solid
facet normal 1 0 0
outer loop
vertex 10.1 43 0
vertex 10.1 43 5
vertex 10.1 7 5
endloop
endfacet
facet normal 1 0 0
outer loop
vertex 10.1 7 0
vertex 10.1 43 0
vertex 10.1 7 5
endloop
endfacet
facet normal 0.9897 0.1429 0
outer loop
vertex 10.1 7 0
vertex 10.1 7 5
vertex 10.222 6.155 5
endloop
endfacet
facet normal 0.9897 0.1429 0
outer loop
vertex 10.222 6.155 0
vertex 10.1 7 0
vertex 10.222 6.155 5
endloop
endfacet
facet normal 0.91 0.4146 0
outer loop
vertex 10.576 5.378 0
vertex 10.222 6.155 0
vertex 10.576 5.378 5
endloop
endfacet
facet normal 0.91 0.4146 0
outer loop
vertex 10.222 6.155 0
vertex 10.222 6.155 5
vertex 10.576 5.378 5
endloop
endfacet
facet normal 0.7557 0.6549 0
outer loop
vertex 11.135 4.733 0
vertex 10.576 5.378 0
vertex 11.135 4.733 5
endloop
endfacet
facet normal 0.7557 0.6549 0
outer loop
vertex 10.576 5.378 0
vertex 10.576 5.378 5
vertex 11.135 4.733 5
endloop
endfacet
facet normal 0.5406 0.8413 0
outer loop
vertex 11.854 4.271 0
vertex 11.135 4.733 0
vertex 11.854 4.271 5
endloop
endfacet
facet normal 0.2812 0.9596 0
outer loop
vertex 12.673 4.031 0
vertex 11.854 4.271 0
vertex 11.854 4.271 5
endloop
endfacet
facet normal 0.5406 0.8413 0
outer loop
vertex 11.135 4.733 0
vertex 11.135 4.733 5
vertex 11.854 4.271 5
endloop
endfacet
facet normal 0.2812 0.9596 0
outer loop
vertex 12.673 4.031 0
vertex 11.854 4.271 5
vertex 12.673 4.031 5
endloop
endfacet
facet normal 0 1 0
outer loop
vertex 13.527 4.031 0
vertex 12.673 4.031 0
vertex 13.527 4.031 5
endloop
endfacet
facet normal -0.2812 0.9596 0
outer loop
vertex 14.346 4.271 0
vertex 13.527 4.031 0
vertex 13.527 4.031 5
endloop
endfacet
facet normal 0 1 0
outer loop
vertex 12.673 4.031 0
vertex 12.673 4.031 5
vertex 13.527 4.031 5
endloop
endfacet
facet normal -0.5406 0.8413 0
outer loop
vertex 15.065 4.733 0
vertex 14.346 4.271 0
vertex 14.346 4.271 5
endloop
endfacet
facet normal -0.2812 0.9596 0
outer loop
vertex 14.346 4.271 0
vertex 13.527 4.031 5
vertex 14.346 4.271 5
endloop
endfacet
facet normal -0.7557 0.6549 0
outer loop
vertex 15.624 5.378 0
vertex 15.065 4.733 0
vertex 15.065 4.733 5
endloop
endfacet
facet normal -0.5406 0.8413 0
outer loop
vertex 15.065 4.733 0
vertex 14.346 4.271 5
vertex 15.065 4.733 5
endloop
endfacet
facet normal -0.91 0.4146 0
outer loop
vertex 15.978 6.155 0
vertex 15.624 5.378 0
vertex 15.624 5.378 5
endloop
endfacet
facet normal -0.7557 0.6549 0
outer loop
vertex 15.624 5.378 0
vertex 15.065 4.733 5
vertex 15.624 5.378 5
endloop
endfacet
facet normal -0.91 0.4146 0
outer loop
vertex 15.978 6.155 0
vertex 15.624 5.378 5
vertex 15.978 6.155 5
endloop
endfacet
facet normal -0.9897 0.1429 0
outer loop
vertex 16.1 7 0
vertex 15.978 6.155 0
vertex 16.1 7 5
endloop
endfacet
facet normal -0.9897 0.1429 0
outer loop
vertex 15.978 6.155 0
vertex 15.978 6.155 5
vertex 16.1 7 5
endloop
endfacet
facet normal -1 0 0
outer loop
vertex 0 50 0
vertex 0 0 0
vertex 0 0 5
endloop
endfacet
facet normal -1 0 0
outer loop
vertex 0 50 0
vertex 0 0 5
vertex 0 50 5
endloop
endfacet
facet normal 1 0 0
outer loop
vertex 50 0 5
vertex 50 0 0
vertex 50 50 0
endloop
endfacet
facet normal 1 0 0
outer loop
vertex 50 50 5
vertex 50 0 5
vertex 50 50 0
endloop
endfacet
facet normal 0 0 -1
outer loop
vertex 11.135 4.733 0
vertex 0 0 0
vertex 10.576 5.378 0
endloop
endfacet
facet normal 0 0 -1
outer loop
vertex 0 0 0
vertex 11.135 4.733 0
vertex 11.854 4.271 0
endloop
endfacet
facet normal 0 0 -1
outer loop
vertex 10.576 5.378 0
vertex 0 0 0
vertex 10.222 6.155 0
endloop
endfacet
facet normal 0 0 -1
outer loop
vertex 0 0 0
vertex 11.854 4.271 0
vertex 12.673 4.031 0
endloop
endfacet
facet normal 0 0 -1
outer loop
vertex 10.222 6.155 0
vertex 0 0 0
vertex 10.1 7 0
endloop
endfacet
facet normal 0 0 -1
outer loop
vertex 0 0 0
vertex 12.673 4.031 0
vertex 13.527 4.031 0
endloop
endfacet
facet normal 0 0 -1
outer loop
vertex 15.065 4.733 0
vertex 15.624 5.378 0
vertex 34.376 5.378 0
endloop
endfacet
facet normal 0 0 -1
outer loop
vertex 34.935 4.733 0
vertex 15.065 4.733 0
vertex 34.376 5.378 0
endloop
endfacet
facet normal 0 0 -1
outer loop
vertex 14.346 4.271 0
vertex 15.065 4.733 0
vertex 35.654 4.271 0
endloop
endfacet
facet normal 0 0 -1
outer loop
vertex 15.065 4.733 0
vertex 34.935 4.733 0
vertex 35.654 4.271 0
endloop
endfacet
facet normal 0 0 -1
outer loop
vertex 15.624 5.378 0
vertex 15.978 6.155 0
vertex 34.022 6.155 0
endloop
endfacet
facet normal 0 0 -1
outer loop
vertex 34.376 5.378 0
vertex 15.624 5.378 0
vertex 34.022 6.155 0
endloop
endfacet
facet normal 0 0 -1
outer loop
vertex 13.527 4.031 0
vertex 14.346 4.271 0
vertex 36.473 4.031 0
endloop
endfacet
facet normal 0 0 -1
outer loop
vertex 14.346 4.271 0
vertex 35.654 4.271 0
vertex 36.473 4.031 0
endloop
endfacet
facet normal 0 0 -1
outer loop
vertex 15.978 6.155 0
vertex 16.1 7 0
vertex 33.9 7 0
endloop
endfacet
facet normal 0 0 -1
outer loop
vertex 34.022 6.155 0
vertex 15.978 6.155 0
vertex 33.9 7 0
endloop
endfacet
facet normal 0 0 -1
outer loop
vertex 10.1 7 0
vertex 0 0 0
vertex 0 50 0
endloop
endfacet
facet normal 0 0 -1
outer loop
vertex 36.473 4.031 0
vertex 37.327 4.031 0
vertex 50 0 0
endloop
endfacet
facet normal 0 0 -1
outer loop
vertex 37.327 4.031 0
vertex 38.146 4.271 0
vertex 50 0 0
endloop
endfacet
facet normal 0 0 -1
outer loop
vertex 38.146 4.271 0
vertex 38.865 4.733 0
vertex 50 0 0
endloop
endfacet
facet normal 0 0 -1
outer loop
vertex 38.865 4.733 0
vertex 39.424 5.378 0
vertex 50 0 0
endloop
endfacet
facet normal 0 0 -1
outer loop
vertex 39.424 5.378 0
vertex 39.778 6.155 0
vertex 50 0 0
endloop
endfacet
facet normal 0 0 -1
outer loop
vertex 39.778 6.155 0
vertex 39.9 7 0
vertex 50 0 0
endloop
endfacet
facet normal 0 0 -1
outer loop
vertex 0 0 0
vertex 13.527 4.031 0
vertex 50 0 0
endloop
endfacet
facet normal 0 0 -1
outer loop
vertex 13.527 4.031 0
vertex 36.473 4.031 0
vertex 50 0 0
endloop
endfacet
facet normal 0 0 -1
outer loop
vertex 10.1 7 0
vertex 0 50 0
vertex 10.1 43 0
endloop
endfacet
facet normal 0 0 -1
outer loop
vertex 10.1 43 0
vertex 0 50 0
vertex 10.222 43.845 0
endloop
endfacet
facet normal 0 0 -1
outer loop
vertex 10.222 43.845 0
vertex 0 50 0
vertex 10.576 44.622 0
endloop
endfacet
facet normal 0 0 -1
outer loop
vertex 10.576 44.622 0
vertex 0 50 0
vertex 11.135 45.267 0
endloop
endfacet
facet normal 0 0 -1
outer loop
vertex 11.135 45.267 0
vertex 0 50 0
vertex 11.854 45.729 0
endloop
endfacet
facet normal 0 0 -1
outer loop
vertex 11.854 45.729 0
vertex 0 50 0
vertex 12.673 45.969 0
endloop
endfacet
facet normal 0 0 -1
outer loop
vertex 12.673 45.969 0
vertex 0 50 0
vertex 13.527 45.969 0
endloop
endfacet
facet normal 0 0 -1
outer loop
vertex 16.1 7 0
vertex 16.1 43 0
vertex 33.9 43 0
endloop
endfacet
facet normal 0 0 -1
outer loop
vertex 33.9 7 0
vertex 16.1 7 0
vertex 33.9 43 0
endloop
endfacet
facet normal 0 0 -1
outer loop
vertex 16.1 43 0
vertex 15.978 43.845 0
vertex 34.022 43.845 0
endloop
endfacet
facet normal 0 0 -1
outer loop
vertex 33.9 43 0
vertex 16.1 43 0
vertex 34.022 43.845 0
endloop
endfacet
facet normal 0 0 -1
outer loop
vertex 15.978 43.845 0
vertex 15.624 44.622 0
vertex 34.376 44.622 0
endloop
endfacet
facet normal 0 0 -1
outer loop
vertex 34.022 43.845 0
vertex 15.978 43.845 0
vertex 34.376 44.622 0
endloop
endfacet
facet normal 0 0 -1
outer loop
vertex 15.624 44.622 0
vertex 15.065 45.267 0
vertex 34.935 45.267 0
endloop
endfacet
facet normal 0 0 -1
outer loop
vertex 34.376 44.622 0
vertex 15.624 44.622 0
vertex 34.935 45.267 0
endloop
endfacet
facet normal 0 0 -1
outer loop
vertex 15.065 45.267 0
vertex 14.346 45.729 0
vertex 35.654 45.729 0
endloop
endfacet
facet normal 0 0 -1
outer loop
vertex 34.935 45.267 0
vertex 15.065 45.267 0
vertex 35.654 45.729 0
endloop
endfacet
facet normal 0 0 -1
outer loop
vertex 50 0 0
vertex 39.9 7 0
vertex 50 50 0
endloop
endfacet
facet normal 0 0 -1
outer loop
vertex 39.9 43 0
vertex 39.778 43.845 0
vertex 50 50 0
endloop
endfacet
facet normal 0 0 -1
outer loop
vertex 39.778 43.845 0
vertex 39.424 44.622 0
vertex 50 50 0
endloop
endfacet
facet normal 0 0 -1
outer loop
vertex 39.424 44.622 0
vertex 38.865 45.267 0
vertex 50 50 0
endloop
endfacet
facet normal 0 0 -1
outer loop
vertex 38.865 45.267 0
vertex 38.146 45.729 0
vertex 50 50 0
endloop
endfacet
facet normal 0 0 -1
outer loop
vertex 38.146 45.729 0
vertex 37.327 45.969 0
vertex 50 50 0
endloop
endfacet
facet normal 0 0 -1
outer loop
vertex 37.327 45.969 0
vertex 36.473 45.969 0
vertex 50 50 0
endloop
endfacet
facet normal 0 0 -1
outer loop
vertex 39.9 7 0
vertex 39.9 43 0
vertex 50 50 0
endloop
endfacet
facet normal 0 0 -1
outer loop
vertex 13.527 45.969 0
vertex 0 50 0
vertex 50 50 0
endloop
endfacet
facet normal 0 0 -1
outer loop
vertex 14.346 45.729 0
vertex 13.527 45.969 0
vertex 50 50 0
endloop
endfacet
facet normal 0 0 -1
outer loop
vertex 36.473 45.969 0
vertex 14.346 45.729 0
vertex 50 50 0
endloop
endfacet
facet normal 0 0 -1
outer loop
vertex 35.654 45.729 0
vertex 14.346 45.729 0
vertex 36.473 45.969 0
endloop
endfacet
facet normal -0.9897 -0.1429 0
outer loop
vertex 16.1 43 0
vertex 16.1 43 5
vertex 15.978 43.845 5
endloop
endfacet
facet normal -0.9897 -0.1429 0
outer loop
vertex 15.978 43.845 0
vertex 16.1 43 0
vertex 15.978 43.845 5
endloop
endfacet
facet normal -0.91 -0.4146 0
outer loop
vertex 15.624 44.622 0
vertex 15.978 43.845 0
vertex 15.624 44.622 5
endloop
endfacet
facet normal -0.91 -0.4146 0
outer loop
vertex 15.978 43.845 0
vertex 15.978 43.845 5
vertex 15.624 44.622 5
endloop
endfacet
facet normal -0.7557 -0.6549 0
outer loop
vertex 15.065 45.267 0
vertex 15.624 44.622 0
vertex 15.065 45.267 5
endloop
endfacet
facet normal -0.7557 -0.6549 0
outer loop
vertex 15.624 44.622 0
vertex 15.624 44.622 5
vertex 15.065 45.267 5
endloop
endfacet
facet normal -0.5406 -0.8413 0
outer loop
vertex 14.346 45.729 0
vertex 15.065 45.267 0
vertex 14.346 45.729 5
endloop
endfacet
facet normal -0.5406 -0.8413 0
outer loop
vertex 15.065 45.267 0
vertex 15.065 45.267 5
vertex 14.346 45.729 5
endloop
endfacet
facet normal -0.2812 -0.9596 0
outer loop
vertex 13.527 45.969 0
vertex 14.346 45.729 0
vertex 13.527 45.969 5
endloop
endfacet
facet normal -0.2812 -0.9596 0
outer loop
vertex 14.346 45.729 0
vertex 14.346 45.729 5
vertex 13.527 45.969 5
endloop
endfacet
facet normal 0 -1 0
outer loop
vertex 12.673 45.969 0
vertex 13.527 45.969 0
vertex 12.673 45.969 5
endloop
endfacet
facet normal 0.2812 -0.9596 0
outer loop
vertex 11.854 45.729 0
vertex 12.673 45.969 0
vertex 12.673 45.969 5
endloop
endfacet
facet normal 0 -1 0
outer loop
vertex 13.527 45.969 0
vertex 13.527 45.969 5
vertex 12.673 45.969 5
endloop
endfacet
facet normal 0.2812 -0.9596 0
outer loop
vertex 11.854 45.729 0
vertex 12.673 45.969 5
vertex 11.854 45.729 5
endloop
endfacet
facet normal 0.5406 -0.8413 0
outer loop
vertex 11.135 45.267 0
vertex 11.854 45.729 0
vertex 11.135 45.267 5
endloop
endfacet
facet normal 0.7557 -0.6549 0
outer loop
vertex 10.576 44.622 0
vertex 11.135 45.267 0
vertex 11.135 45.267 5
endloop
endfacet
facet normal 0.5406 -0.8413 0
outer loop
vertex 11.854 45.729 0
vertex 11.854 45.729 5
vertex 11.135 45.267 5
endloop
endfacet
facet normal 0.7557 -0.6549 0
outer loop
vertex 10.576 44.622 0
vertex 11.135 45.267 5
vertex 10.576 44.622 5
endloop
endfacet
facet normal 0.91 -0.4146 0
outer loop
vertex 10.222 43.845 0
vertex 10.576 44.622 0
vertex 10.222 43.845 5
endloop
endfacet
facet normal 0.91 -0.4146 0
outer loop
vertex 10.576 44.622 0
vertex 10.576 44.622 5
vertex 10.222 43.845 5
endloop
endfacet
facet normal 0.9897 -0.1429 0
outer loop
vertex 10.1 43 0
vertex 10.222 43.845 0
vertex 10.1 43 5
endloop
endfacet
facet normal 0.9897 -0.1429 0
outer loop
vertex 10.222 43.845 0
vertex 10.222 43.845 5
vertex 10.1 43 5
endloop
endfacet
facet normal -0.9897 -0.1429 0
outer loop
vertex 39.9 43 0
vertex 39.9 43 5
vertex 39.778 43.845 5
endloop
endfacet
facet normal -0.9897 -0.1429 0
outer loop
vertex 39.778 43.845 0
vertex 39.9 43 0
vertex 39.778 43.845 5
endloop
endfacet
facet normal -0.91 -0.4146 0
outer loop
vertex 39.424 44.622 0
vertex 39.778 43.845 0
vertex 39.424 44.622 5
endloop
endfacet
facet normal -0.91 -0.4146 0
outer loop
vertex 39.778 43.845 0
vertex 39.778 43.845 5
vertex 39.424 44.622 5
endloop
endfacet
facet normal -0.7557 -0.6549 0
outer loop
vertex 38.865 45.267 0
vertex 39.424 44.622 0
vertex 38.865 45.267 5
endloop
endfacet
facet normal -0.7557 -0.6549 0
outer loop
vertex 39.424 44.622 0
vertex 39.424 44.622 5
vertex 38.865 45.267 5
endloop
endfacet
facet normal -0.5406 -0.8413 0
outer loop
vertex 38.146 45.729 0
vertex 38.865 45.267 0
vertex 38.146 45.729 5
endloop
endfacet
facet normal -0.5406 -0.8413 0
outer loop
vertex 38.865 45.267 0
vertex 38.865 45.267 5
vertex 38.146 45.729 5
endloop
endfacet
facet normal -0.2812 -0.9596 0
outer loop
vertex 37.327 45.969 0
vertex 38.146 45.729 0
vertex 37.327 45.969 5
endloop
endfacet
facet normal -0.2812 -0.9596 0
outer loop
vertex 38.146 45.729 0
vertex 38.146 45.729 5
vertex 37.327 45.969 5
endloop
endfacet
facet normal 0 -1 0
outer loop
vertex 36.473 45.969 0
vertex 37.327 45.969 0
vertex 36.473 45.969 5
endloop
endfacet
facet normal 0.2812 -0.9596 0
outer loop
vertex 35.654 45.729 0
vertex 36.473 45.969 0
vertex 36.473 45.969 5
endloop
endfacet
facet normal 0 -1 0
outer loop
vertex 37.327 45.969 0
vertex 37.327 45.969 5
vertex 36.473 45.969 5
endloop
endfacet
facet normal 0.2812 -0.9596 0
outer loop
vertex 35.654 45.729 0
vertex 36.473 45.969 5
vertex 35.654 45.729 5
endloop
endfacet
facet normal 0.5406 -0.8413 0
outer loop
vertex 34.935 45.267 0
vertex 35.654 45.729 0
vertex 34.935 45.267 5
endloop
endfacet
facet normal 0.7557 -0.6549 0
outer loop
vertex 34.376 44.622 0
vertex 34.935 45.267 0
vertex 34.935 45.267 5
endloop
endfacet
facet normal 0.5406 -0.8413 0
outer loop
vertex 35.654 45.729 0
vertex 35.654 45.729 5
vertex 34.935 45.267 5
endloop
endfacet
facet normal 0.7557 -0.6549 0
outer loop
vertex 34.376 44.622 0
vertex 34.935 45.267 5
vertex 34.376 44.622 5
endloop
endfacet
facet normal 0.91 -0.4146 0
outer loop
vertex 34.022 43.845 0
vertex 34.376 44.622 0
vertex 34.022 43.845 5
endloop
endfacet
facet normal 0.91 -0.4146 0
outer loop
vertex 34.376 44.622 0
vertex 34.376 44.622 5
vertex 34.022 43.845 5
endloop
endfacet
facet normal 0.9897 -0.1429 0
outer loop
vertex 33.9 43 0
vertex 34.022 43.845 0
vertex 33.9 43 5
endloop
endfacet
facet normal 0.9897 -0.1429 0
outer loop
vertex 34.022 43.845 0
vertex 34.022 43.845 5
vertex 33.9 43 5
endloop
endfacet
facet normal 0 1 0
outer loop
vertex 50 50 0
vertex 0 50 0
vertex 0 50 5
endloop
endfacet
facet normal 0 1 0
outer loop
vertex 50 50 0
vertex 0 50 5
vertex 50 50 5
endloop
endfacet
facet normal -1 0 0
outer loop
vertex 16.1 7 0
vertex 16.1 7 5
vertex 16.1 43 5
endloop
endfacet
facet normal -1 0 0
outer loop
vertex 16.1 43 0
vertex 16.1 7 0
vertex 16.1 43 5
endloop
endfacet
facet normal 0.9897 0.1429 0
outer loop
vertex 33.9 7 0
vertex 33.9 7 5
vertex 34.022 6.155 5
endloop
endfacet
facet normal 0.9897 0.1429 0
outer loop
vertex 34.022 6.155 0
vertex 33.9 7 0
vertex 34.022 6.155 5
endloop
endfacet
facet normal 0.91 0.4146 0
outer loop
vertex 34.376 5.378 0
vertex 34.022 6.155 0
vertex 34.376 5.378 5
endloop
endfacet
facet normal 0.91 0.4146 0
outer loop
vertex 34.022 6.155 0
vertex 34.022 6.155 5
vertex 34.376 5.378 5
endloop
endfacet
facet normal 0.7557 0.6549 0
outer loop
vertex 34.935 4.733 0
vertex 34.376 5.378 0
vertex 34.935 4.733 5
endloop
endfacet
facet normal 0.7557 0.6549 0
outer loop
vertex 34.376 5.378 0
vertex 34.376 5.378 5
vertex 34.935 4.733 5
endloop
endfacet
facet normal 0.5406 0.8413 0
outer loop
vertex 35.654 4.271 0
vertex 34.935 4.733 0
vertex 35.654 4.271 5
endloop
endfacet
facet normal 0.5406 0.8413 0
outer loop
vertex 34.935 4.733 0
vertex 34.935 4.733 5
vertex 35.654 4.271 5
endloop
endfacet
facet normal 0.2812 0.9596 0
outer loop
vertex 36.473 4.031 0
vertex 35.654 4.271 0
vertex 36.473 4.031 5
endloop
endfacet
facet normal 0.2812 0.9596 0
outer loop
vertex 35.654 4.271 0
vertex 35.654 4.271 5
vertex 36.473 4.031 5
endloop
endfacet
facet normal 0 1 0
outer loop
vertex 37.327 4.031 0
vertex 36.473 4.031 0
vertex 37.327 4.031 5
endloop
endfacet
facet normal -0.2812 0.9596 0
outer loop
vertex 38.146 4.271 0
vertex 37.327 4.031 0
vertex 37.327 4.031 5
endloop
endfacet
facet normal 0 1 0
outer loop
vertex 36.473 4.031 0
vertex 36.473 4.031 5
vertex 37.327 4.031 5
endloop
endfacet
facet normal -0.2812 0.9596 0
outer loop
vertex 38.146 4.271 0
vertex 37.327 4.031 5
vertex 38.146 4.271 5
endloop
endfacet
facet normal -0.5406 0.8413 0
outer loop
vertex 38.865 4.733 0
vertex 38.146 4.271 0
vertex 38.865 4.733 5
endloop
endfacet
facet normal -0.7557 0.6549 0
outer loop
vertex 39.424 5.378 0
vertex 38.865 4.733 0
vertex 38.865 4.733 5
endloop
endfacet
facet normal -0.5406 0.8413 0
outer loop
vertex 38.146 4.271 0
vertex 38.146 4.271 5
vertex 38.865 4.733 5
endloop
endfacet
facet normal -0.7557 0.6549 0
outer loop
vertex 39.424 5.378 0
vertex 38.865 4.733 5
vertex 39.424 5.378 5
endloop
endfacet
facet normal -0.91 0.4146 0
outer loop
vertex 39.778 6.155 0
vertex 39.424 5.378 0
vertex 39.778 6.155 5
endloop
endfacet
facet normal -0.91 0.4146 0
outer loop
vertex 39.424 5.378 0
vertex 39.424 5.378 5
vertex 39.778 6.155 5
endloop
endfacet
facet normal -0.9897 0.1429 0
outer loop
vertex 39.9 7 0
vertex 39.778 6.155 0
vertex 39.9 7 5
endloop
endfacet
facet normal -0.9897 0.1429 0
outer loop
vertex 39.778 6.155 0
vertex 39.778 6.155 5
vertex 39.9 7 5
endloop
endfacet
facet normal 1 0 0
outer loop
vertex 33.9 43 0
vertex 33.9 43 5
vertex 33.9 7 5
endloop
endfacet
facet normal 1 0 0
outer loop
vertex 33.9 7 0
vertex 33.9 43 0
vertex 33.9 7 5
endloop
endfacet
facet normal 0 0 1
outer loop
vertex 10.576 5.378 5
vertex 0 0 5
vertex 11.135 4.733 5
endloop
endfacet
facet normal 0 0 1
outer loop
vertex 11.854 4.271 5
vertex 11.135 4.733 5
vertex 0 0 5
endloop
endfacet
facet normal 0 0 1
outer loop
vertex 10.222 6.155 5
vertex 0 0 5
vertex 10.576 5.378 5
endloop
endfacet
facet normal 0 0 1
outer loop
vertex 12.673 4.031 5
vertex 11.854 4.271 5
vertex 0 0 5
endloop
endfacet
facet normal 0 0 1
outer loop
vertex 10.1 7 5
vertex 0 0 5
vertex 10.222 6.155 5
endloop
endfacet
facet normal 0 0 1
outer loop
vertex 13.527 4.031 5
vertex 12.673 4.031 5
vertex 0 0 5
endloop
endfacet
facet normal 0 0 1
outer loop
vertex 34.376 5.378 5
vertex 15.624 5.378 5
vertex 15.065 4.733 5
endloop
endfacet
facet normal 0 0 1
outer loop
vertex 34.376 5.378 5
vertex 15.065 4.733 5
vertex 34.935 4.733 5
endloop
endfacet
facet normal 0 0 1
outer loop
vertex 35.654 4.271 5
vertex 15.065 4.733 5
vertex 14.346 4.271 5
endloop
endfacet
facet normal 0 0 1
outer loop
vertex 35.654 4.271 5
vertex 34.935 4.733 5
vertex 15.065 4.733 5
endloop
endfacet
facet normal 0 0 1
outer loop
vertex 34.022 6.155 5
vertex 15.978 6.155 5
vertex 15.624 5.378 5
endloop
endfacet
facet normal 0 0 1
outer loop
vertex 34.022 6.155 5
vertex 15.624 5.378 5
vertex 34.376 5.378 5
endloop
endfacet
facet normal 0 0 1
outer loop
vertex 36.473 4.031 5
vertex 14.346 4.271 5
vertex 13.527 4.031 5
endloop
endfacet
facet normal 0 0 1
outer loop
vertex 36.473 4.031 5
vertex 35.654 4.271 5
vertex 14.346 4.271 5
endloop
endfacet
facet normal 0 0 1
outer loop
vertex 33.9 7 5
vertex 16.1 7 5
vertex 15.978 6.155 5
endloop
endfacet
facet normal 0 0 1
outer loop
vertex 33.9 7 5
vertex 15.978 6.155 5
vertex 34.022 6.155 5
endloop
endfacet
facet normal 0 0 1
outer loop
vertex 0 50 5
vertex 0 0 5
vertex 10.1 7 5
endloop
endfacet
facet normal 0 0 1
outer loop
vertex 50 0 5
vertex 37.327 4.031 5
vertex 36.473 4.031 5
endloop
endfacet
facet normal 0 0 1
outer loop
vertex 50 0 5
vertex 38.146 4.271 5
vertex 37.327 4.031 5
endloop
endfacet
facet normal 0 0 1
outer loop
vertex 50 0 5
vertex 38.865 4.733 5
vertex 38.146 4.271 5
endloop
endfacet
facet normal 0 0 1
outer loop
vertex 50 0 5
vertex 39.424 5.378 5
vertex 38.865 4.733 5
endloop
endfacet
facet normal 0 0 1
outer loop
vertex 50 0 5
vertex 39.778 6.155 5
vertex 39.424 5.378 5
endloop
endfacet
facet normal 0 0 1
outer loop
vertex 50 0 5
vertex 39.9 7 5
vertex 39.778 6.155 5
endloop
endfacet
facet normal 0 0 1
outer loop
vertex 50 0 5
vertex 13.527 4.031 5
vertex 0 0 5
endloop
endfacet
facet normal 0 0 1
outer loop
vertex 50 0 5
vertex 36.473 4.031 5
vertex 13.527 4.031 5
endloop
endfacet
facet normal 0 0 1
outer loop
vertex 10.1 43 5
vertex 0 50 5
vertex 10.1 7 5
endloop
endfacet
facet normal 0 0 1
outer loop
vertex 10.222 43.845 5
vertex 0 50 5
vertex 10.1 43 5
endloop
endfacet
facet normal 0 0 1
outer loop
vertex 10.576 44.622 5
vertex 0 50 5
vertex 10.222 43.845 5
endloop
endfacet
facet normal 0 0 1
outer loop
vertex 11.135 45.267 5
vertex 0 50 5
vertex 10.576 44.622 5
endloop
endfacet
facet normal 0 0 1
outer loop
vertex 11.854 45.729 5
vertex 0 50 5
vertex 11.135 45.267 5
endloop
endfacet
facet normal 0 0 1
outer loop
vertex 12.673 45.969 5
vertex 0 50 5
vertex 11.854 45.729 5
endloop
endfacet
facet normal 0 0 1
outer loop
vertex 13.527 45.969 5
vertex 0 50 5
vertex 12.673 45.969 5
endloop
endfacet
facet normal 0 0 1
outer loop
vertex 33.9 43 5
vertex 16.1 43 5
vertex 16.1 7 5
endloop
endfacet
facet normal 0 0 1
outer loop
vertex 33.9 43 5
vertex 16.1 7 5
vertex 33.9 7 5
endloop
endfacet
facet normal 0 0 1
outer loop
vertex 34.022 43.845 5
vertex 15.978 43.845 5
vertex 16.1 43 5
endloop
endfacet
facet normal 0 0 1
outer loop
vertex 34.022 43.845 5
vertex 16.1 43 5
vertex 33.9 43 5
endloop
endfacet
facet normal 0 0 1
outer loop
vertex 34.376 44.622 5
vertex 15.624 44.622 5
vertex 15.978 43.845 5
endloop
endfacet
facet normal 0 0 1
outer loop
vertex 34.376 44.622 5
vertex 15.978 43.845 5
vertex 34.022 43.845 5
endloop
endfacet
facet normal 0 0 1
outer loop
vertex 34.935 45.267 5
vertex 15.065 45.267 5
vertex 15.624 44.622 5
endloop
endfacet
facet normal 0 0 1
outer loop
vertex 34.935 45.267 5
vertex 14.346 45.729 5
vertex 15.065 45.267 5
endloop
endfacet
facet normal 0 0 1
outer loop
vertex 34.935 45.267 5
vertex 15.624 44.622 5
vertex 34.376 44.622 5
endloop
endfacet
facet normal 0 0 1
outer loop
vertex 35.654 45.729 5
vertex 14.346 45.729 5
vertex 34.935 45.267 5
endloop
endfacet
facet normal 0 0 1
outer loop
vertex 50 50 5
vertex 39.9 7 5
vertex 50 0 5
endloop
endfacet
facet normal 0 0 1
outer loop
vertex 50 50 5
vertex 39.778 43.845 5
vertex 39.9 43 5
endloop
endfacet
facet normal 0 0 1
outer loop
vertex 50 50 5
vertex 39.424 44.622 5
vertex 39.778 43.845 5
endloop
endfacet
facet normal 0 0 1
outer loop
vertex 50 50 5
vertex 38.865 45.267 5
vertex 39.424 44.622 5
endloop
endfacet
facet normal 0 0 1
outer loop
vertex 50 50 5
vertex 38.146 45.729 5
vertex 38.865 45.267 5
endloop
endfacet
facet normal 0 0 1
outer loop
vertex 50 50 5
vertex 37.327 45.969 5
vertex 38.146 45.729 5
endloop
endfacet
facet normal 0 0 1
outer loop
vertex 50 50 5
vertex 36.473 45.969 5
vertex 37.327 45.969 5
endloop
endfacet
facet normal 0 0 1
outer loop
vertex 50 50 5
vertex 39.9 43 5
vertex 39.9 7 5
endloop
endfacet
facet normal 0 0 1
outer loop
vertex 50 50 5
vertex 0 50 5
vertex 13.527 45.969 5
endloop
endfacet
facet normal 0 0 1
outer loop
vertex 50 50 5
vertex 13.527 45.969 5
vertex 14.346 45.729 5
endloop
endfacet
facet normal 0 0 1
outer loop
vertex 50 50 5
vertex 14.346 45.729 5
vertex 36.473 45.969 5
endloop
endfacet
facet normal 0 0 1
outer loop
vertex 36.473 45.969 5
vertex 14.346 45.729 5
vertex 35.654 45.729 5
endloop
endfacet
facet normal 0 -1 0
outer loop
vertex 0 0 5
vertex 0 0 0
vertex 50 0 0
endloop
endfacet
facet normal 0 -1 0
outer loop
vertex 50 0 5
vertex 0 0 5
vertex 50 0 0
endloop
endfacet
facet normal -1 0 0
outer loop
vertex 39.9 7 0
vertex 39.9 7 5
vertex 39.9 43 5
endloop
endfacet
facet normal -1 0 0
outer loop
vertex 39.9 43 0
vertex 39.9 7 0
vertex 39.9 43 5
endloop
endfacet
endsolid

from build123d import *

# Parameters (mm, degrees)
SKETCH1_W           = 50
SKETCH1_H           = 50
BOSS_EXTRUDE1_DEPTH = 5
CUT_EXTRUDE1_DEPTH  = 71.887234394


with BuildPart() as part:
    # Sketch1 → Boss-Extrude1 (new body)
    with BuildSketch(Plane.XY):
        with Locations((25, 25)):
            Rectangle(SKETCH1_W, SKETCH1_H)
    extrude(amount=BOSS_EXTRUDE1_DEPTH)

    # Sketch2 → Cut-Extrude1 (cut, through all)
    with BuildSketch(Plane.XY.offset(5)):
        with BuildLine():
            Line((10.1, 43), (10.1, 7))
            ThreePointArc((10.1, 7), (13.1, 4), (16.1, 7))
            Line((16.1, 7), (16.1, 43))
            ThreePointArc((16.1, 43), (13.1, 46), (10.1, 43))
        make_face()
        with BuildLine():
            Line((33.9, 43), (33.9, 7))
            ThreePointArc((33.9, 7), (36.9, 4), (39.9, 7))
            Line((39.9, 7), (39.9, 43))
            ThreePointArc((39.9, 43), (36.9, 46), (33.9, 43))
        make_face()
    extrude(amount=-CUT_EXTRUDE1_DEPTH, mode=Mode.SUBTRACT)


solid = part.part
